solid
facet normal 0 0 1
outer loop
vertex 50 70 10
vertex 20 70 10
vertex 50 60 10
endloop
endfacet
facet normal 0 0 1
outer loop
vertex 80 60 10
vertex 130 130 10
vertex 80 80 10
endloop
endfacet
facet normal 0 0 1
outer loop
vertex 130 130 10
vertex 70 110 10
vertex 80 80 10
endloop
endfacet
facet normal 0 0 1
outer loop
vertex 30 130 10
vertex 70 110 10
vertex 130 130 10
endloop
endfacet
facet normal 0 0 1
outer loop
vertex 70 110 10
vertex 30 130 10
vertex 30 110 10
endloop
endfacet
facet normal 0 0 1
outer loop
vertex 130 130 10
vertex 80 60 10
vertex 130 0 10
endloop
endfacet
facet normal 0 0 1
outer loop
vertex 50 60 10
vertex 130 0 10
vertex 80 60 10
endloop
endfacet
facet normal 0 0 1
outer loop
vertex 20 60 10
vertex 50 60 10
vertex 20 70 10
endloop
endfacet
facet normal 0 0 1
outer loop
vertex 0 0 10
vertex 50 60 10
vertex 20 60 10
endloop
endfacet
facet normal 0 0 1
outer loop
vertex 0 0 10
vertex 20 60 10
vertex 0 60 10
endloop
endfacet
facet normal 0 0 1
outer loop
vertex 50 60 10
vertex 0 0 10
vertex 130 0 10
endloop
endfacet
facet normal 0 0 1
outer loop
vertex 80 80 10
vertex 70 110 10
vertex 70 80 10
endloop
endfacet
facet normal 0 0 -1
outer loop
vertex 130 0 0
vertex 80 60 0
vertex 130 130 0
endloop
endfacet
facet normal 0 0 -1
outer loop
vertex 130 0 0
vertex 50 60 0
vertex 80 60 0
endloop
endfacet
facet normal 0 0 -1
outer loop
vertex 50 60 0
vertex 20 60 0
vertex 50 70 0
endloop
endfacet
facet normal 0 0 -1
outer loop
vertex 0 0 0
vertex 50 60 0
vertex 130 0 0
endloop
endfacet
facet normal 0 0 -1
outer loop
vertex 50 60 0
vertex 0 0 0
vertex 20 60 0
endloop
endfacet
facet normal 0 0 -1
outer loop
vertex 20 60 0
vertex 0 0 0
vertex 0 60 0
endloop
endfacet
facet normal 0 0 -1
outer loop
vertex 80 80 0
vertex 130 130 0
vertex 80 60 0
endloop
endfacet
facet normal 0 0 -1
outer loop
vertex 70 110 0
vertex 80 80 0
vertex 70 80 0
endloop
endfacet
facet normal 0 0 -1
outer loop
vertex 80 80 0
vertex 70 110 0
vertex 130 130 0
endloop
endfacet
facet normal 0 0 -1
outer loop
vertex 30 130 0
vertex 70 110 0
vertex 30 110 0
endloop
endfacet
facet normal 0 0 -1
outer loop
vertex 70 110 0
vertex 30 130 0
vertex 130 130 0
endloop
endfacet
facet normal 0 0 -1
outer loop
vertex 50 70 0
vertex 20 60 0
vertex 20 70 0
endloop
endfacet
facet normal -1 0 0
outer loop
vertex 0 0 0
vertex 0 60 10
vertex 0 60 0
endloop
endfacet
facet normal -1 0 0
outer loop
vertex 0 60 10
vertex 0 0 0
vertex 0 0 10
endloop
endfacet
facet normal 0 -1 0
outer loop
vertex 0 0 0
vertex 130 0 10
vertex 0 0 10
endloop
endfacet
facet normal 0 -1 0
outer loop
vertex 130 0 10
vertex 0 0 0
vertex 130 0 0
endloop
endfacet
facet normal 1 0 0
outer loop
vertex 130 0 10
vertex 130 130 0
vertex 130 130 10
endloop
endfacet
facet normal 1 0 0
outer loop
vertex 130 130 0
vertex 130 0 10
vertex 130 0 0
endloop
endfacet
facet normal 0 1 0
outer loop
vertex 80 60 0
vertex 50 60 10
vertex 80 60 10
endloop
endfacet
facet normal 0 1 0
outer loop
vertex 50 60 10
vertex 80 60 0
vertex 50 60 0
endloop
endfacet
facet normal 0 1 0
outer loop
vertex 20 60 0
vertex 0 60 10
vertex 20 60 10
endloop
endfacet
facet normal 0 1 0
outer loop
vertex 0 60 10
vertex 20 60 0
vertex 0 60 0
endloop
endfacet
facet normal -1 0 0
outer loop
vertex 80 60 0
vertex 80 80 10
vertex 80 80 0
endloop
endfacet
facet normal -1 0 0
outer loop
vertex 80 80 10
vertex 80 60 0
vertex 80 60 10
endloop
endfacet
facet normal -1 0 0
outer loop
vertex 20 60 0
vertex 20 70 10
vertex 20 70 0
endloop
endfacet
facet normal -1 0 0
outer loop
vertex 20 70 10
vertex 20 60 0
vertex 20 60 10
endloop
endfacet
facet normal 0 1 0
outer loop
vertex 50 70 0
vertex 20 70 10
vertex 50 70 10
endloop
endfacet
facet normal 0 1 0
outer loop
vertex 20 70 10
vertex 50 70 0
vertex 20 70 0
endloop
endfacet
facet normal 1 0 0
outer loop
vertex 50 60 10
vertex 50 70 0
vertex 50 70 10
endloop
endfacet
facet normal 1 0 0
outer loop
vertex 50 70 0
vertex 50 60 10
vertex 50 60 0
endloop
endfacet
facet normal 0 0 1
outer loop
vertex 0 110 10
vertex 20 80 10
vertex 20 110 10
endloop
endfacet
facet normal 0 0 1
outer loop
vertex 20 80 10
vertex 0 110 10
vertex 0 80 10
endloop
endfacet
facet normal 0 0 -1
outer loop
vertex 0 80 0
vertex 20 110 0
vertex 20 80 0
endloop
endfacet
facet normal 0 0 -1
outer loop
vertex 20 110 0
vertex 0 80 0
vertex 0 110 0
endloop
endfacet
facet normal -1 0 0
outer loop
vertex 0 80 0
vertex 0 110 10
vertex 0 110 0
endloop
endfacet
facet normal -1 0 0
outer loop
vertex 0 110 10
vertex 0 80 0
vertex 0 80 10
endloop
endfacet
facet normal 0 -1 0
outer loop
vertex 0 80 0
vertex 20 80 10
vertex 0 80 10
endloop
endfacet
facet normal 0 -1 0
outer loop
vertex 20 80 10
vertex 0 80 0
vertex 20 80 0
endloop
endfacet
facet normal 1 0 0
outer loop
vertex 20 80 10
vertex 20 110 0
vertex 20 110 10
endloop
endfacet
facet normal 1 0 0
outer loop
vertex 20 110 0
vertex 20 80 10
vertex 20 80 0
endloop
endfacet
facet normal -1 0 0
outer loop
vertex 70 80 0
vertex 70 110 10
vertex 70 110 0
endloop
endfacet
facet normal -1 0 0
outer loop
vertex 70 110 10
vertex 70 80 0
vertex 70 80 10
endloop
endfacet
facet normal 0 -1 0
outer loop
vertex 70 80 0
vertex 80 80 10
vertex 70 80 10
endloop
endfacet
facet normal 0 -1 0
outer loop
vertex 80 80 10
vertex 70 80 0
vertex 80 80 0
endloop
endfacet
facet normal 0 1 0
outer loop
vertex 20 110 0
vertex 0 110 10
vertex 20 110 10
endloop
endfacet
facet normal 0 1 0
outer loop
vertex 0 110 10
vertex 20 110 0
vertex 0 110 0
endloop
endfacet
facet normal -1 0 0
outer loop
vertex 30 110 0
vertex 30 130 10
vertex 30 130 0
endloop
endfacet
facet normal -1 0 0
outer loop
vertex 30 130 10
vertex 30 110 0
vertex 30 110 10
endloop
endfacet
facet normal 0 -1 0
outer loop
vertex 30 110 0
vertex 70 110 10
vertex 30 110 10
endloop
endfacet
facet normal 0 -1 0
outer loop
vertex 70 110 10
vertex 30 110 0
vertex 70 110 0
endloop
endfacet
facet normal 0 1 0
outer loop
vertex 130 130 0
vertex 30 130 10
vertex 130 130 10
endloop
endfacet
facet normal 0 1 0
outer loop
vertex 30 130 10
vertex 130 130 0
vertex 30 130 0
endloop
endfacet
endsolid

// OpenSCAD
union() {
    translate([0, 0, 0])
        cube([10, 10, 10]);
    translate([10, 0, 0])
        cube([10, 10, 10]);
    translate([20, 0, 0])
        cube([10, 10, 10]);
    translate([30, 0, 0])
        cube([10, 10, 10]);
    translate([40, 0, 0])
        cube([10, 10, 10]);
    translate([50, 0, 0])
        cube([10, 10, 10]);
    translate([60, 0, 0])
        cube([10, 10, 10]);
    translate([70, 0, 0])
        cube([10, 10, 10]);
    translate([80, 0, 0])
        cube([10, 10, 10]);
    translate([90, 0, 0])
        cube([10, 10, 10]);
    translate([100, 0, 0])
        cube([10, 10, 10]);
    translate([110, 0, 0])
        cube([10, 10, 10]);
    translate([120, 0, 0])
        cube([10, 10, 10]);
    translate([0, 10, 0])
        cube([10, 10, 10]);
    translate([10, 10, 0])
        cube([10, 10, 10]);
    translate([20, 10, 0])
        cube([10, 10, 10]);
    translate([30, 10, 0])
        cube([10, 10, 10]);
    translate([40, 10, 0])
        cube([10, 10, 10]);
    translate([50, 10, 0])
        cube([10, 10, 10]);
    translate([60, 10, 0])
        cube([10, 10, 10]);
    translate([70, 10, 0])
        cube([10, 10, 10]);
    translate([80, 10, 0])
        cube([10, 10, 10]);
    translate([90, 10, 0])
        cube([10, 10, 10]);
    translate([100, 10, 0])
        cube([10, 10, 10]);
    translate([110, 10, 0])
        cube([10, 10, 10]);
    translate([120, 10, 0])
        cube([10, 10, 10]);
    translate([0, 20, 0])
        cube([10, 10, 10]);
    translate([10, 20, 0])
        cube([10, 10, 10]);
    translate([20, 20, 0])
        cube([10, 10, 10]);
    translate([30, 20, 0])
        cube([10, 10, 10]);
    translate([40, 20, 0])
        cube([10, 10, 10]);
    translate([50, 20, 0])
        cube([10, 10, 10]);
    translate([60, 20, 0])
        cube([10, 10, 10]);
    translate([70, 20, 0])
        cube([10, 10, 10]);
    translate([80, 20, 0])
        cube([10, 10, 10]);
    translate([90, 20, 0])
        cube([10, 10, 10]);
    translate([100, 20, 0])
        cube([10, 10, 10]);
    translate([110, 20, 0])
        cube([10, 10, 10]);
    translate([120, 20, 0])
        cube([10, 10, 10]);
    translate([0, 30, 0])
        cube([10, 10, 10]);
    translate([10, 30, 0])
        cube([10, 10, 10]);
    translate([20, 30, 0])
        cube([10, 10, 10]);
    translate([30, 30, 0])
        cube([10, 10, 10]);
    translate([40, 30, 0])
        cube([10, 10, 10]);
    translate([50, 30, 0])
        cube([10, 10, 10]);
    translate([60, 30, 0])
        cube([10, 10, 10]);
    translate([70, 30, 0])
        cube([10, 10, 10]);
    translate([80, 30, 0])
        cube([10, 10, 10]);
    translate([90, 30, 0])
        cube([10, 10, 10]);
    translate([100, 30, 0])
        cube([10, 10, 10]);
    translate([110, 30, 0])
        cube([10, 10, 10]);
    translate([120, 30, 0])
        cube([10, 10, 10]);
    translate([0, 40, 0])
        cube([10, 10, 10]);
    translate([10, 40, 0])
        cube([10, 10, 10]);
    translate([20, 40, 0])
        cube([10, 10, 10]);
    translate([30, 40, 0])
        cube([10, 10, 10]);
    translate([40, 40, 0])
        cube([10, 10, 10]);
    translate([50, 40, 0])
        cube([10, 10, 10]);
    translate([60, 40, 0])
        cube([10, 10, 10]);
    translate([70, 40, 0])
        cube([10, 10, 10]);
    translate([80, 40, 0])
        cube([10, 10, 10]);
    translate([90, 40, 0])
        cube([10, 10, 10]);
    translate([100, 40, 0])
        cube([10, 10, 10]);
    translate([110, 40, 0])
        cube([10, 10, 10]);
    translate([120, 40, 0])
        cube([10, 10, 10]);
    translate([0, 50, 0])
        cube([10, 10, 10]);
    translate([10, 50, 0])
        cube([10, 10, 10]);
    translate([20, 50, 0])
        cube([10, 10, 10]);
    translate([30, 50, 0])
        cube([10, 10, 10]);
    translate([40, 50, 0])
        cube([10, 10, 10]);
    translate([50, 50, 0])
        cube([10, 10, 10]);
    translate([60, 50, 0])
        cube([10, 10, 10]);
    translate([70, 50, 0])
        cube([10, 10, 10]);
    translate([80, 50, 0])
        cube([10, 10, 10]);
    translate([90, 50, 0])
        cube([10, 10, 10]);
    translate([100, 50, 0])
        cube([10, 10, 10]);
    translate([110, 50, 0])
        cube([10, 10, 10]);
    translate([120, 50, 0])
        cube([10, 10, 10]);
    translate([20, 60, 0])
        cube([10, 10, 10]);
    translate([30, 60, 0])
        cube([10, 10, 10]);
    translate([40, 60, 0])
        cube([10, 10, 10]);
    translate([80, 60, 0])
        cube([10, 10, 10]);
    translate([90, 60, 0])
        cube([10, 10, 10]);
    translate([100, 60, 0])
        cube([10, 10, 10]);
    translate([110, 60, 0])
        cube([10, 10, 10]);
    translate([120, 60, 0])
        cube([10, 10, 10]);
    translate([80, 70, 0])
        cube([10, 10, 10]);
    translate([90, 70, 0])
        cube([10, 10, 10]);
    translate([100, 70, 0])
        cube([10, 10, 10]);
    translate([110, 70, 0])
        cube([10, 10, 10]);
    translate([120, 70, 0])
        cube([10, 10, 10]);
    translate([0, 80, 0])
        cube([10, 10, 10]);
    translate([10, 80, 0])
        cube([10, 10, 10]);
    translate([70, 80, 0])
        cube([10, 10, 10]);
    translate([80, 80, 0])
        cube([10, 10, 10]);
    translate([90, 80, 0])
        cube([10, 10, 10]);
    translate([100, 80, 0])
        cube([10, 10, 10]);
    translate([110, 80, 0])
        cube([10, 10, 10]);
    translate([120, 80, 0])
        cube([10, 10, 10]);
    translate([0, 90, 0])
        cube([10, 10, 10]);
    translate([10, 90, 0])
        cube([10, 10, 10]);
    translate([70, 90, 0])
        cube([10, 10, 10]);
    translate([80, 90, 0])
        cube([10, 10, 10]);
    translate([90, 90, 0])
        cube([10, 10, 10]);
    translate([100, 90, 0])
        cube([10, 10, 10]);
    translate([110, 90, 0])
        cube([10, 10, 10]);
    translate([120, 90, 0])
        cube([10, 10, 10]);
    translate([0, 100, 0])
        cube([10, 10, 10]);
    translate([10, 100, 0])
        cube([10, 10, 10]);
    translate([70, 100, 0])
        cube([10, 10, 10]);
    translate([80, 100, 0])
        cube([10, 10, 10]);
    translate([90, 100, 0])
        cube([10, 10, 10]);
    translate([100, 100, 0])
        cube([10, 10, 10]);
    translate([110, 100, 0])
        cube([10, 10, 10]);
    translate([120, 100, 0])
        cube([10, 10, 10]);
    translate([30, 110, 0])
        cube([10, 10, 10]);
    translate([40, 110, 0])
        cube([10, 10, 10]);
    translate([50, 110, 0])
        cube([10, 10, 10]);
    translate([60, 110, 0])
        cube([10, 10, 10]);
    translate([70, 110, 0])
        cube([10, 10, 10]);
    translate([80, 110, 0])
        cube([10, 10, 10]);
    translate([90, 110, 0])
        cube([10, 10, 10]);
    translate([100, 110, 0])
        cube([10, 10, 10]);
    translate([110, 110, 0])
        cube([10, 10, 10]);
    translate([120, 110, 0])
        cube([10, 10, 10]);
    translate([30, 120, 0])
        cube([10, 10, 10]);
    translate([40, 120, 0])
        cube([10, 10, 10]);
    translate([50, 120, 0])
        cube([10, 10, 10]);
    translate([60, 120, 0])
        cube([10, 10, 10]);
    translate([70, 120, 0])
        cube([10, 10, 10]);
    translate([80, 120, 0])
        cube([10, 10, 10]);
    translate([90, 120, 0])
        cube([10, 10, 10]);
    translate([100, 120, 0])
        cube([10, 10, 10]);
    translate([110, 120, 0])
        cube([10, 10, 10]);
    translate([120, 120, 0])
        cube([10, 10, 10]);
}
